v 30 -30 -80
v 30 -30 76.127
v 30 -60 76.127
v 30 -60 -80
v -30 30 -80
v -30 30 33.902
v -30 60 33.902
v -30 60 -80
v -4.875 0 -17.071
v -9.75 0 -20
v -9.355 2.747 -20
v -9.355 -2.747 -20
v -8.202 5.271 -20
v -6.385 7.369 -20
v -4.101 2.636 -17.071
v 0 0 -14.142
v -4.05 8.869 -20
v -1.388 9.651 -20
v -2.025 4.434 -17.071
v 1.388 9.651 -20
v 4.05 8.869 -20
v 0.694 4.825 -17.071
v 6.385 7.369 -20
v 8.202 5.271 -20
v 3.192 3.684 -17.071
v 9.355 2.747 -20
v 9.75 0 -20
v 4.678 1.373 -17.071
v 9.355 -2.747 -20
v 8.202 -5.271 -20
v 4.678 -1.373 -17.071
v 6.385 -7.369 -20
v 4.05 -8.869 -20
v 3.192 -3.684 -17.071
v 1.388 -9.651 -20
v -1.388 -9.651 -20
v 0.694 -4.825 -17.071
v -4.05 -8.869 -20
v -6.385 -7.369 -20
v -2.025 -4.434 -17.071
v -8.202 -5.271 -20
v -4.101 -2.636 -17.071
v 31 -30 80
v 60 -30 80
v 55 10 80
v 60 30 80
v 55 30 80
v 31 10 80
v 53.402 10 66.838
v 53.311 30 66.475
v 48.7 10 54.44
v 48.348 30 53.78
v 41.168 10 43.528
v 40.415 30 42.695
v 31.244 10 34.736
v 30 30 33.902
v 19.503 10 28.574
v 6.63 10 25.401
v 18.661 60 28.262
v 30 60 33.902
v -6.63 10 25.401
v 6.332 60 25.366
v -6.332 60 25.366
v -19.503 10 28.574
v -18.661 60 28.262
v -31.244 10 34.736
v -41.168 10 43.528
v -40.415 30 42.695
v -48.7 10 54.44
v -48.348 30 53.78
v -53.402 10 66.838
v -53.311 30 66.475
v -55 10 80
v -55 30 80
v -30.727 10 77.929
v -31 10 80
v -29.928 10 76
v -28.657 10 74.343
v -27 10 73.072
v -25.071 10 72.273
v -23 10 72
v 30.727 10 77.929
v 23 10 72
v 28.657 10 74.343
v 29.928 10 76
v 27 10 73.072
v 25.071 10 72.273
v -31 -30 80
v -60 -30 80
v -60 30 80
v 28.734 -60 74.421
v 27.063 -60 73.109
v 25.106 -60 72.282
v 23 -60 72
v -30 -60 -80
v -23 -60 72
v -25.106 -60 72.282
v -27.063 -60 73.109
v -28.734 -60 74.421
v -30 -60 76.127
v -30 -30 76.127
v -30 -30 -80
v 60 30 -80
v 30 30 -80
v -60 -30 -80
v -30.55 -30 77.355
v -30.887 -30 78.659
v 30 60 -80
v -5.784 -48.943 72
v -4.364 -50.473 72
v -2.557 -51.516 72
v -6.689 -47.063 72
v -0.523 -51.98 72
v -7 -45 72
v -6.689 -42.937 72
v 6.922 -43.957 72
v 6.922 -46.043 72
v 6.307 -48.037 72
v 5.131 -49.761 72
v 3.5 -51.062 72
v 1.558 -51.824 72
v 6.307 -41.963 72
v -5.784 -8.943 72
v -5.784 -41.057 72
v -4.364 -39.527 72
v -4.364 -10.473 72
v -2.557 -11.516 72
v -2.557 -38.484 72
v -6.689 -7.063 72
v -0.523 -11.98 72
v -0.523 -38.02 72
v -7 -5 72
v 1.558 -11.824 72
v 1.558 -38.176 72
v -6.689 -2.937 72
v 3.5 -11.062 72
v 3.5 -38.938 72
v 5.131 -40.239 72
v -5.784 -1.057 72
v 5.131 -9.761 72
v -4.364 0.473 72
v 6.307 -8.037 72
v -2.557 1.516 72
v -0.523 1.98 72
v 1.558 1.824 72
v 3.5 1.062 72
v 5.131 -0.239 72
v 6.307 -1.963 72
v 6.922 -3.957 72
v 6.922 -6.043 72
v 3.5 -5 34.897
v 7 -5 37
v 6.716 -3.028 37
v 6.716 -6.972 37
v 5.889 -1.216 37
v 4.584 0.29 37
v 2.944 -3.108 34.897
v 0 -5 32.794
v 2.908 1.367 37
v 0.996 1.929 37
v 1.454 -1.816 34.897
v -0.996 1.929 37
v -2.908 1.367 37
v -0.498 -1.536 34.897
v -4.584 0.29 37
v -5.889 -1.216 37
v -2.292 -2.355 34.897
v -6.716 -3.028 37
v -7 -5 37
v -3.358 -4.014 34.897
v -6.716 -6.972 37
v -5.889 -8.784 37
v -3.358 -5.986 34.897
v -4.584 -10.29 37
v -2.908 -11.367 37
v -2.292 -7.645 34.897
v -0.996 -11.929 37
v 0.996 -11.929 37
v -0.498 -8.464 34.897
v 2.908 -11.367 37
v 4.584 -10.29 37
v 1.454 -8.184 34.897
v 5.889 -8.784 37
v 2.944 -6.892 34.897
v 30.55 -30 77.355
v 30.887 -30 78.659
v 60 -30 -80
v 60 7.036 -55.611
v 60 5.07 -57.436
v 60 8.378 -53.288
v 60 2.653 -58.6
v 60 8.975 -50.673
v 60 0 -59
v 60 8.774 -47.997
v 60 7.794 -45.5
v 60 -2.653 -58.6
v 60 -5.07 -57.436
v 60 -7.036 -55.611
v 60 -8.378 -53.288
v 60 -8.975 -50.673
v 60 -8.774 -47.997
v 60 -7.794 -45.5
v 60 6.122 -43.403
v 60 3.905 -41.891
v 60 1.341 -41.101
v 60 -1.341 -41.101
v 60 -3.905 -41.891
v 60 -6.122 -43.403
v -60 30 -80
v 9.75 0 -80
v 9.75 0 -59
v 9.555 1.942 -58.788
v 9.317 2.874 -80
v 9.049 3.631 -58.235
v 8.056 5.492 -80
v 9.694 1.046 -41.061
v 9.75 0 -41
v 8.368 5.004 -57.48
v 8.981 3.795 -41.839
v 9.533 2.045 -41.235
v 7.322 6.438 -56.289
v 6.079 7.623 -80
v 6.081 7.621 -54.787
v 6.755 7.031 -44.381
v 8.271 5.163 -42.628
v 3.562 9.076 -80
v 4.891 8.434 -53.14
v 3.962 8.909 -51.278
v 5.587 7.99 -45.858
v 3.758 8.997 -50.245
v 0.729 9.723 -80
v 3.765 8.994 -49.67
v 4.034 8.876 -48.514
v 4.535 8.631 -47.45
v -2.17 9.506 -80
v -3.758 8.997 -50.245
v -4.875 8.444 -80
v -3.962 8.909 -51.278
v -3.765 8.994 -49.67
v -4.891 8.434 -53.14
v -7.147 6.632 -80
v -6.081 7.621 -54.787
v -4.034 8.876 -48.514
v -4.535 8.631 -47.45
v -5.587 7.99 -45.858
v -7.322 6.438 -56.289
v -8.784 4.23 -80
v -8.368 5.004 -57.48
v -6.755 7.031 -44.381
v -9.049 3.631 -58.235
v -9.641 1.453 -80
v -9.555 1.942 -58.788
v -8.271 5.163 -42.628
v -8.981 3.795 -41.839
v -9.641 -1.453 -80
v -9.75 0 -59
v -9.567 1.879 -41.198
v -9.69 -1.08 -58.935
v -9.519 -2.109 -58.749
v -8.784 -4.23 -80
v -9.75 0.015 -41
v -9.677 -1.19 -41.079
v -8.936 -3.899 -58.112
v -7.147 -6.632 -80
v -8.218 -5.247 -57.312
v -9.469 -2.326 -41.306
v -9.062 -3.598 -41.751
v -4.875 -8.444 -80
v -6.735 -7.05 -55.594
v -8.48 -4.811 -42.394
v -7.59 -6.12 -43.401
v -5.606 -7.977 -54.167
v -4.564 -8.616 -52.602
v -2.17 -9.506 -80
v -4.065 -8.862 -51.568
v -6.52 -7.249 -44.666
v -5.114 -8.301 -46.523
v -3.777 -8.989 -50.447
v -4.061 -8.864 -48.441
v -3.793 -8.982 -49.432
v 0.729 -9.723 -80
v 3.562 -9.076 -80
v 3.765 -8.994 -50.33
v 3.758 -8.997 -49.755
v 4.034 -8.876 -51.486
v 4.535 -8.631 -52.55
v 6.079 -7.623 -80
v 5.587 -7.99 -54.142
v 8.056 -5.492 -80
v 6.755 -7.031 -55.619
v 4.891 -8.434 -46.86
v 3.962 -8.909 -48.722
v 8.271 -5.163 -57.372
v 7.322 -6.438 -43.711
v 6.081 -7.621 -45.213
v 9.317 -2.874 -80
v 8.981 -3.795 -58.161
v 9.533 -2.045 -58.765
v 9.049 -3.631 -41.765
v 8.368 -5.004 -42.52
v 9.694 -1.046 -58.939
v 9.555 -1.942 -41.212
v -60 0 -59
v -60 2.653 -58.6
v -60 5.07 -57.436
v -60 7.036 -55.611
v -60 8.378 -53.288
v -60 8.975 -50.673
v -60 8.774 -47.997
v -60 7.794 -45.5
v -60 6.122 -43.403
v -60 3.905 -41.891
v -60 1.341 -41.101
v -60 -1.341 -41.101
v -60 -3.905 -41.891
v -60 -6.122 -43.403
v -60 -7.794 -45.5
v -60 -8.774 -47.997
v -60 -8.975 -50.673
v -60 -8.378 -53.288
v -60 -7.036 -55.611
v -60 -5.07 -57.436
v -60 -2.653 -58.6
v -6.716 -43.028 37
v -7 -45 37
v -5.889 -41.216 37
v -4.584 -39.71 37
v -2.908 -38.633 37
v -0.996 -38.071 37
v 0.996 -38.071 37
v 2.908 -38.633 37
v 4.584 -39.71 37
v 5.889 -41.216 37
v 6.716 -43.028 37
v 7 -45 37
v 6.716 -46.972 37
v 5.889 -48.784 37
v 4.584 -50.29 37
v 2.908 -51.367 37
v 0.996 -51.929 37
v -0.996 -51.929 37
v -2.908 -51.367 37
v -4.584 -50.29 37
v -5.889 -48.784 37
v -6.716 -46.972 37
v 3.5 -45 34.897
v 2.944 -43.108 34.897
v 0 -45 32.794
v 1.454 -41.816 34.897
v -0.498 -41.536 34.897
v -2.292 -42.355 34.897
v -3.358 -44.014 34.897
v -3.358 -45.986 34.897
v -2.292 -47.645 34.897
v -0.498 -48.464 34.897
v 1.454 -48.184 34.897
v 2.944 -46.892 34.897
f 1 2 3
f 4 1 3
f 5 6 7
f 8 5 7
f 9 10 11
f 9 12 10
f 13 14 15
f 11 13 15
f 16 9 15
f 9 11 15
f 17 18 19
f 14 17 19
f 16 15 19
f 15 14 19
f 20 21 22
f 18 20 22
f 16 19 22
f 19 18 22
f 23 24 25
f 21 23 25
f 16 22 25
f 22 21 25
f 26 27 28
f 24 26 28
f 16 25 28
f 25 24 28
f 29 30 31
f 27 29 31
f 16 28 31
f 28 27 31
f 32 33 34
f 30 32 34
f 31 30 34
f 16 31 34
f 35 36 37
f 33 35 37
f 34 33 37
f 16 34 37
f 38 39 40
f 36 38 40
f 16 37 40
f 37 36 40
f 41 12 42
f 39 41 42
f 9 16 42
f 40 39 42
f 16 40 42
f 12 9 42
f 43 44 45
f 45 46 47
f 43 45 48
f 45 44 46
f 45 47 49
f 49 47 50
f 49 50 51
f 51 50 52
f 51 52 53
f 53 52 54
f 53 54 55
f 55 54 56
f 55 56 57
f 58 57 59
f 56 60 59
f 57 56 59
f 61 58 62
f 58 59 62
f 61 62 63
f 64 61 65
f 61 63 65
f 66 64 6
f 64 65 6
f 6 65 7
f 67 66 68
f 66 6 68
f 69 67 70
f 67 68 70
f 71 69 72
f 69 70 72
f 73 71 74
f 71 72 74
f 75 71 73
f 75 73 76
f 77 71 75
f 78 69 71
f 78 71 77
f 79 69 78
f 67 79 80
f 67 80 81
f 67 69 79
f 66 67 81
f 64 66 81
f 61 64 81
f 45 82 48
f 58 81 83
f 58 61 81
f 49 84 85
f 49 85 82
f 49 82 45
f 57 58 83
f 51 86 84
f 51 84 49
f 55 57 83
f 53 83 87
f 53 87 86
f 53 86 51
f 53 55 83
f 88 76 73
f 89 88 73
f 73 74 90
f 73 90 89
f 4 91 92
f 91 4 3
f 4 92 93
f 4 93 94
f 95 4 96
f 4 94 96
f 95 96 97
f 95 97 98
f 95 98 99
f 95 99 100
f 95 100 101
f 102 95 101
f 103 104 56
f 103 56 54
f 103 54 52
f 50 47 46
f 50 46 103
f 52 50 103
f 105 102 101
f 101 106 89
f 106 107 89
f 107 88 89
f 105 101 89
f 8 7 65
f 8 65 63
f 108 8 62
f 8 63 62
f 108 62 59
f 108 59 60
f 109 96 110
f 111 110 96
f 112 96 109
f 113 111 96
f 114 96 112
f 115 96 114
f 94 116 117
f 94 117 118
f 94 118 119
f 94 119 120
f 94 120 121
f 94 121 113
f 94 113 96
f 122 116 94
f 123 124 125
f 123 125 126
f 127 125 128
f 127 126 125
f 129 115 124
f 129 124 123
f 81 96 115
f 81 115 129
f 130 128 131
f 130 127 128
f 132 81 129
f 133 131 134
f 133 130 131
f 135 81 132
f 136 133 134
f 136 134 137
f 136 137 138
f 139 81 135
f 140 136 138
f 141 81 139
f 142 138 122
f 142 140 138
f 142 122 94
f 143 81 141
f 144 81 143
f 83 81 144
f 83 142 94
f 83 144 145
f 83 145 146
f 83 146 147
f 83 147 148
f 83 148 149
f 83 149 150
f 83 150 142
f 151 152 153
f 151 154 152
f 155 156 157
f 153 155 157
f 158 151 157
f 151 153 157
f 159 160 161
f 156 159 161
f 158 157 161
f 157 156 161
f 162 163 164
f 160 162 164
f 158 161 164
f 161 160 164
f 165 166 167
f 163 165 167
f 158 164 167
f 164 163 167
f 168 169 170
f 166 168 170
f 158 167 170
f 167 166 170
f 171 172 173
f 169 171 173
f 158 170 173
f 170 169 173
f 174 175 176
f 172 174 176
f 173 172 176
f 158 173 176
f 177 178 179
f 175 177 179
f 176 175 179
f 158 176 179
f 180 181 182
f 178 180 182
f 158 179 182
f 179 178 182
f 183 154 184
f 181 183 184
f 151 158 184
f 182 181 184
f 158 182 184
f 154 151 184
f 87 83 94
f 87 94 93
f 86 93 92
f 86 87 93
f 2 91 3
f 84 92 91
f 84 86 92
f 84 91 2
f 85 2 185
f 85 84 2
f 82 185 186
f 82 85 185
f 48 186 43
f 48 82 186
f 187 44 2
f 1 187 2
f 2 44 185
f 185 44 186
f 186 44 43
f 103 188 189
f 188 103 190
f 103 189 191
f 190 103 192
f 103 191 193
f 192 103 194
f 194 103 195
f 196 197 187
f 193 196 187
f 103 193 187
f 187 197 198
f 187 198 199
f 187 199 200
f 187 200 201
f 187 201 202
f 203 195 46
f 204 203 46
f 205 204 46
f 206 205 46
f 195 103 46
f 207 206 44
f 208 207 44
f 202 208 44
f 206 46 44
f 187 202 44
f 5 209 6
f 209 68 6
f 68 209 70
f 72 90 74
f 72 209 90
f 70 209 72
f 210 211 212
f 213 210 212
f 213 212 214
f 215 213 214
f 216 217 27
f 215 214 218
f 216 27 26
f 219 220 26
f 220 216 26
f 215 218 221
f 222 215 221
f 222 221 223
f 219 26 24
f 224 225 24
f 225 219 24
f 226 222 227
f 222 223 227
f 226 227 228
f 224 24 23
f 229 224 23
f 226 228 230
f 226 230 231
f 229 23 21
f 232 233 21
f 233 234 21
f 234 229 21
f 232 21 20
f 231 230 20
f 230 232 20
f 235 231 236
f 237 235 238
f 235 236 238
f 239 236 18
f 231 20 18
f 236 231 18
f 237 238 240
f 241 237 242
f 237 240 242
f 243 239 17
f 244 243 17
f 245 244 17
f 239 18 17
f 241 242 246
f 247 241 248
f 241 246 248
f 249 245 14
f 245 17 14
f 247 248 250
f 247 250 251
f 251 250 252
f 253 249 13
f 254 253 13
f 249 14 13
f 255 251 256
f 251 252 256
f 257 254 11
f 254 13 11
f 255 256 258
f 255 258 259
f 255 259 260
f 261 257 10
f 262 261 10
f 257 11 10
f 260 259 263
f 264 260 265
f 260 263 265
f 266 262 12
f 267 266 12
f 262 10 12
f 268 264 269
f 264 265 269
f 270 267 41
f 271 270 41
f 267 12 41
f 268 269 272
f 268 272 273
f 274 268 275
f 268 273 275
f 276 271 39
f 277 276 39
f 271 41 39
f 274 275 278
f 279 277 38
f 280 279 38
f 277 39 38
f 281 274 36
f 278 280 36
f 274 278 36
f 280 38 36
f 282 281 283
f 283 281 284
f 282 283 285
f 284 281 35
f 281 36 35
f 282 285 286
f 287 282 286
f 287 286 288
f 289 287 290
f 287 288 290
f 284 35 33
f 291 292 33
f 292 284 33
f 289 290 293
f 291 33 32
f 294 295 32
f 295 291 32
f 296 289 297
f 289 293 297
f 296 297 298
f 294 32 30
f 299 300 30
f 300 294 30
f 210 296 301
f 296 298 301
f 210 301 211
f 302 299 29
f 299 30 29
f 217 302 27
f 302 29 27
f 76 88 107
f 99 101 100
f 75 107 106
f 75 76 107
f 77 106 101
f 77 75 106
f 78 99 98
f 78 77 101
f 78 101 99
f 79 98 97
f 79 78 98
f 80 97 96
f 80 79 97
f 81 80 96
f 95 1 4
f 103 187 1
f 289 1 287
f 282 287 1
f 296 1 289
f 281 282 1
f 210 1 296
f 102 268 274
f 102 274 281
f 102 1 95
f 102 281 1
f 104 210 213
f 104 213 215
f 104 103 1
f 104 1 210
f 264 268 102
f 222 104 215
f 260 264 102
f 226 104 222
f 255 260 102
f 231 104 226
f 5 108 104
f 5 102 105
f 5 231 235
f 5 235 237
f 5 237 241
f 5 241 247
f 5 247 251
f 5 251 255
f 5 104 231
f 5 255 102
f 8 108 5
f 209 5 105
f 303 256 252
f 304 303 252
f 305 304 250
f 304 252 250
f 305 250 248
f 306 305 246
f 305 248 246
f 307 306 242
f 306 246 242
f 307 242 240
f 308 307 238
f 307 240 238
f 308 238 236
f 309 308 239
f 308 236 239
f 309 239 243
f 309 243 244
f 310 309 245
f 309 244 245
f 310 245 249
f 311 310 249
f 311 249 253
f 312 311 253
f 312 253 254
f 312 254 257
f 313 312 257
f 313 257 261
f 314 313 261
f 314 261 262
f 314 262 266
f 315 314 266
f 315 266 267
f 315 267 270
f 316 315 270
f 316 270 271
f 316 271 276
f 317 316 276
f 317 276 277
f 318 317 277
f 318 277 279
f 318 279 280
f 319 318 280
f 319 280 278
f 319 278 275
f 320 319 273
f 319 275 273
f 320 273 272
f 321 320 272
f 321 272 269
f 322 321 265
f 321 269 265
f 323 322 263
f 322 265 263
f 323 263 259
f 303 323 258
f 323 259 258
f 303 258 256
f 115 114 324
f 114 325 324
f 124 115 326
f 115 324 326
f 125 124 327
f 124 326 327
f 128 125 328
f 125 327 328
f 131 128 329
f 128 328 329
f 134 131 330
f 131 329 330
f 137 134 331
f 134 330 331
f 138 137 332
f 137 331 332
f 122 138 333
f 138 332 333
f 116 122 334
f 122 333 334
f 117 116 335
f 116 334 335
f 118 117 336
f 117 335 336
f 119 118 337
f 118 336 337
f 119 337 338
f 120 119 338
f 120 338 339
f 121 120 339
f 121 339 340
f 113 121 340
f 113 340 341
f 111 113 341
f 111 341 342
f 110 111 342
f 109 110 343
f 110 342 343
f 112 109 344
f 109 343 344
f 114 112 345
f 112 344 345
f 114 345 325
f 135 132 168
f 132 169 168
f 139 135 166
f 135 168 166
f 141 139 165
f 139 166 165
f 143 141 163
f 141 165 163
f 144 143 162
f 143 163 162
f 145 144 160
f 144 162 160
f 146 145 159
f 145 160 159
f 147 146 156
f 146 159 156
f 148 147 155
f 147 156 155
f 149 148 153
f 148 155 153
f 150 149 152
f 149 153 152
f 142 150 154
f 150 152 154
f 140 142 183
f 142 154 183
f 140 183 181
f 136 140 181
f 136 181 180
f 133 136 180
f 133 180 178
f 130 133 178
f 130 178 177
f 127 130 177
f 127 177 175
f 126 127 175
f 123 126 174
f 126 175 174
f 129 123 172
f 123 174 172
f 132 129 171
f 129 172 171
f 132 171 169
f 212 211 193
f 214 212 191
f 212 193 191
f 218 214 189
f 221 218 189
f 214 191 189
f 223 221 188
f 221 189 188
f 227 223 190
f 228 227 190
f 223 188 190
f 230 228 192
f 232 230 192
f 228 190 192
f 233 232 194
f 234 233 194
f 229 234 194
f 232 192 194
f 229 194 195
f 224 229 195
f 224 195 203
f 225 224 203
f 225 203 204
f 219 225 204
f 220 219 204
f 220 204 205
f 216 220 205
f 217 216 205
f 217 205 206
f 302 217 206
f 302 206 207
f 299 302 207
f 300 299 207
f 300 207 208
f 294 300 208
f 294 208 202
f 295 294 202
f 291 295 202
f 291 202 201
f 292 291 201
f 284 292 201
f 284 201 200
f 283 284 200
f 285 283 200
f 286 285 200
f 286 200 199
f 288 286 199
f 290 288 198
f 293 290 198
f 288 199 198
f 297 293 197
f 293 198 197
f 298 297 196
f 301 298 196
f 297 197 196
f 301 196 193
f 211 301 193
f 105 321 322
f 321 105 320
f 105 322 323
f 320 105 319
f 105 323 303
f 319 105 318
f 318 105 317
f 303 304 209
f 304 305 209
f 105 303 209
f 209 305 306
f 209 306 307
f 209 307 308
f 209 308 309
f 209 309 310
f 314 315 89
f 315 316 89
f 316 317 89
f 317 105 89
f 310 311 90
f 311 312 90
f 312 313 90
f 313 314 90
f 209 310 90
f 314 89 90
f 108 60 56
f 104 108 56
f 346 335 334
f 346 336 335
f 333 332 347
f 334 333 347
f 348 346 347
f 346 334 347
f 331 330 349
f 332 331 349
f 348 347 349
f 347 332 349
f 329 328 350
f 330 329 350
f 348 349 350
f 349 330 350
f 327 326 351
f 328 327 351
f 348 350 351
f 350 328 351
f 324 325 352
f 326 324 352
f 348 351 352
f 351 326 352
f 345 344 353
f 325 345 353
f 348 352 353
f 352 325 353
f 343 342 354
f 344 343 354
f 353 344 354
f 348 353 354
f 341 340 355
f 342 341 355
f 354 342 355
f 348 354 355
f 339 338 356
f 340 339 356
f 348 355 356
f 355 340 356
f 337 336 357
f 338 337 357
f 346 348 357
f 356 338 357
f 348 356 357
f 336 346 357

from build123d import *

# Parameters (mm, degrees)
ESTRUSIONE_ESTRUSIONE1_DEPTH = 80
SCHIZZO2_R                   = 55
TAGLIO_ESTRUSIONE1_DEPTH     = 50
TAGLIO_ESTRUSIONE2_REACH     = 124.066
FORO_18_0_18_1_D             = 18
FORO_FILETTATO_M22_1_D       = 19.5
FORO_FILETTATO_M22_1_DEPTH   = 60
FORO_FILETTATO_M22_1_TIP     = 5.858391036
FORO_FILETTATO_M16_1_D       = 14
FORO_FILETTATO_M16_1_DEPTH   = 35
FORO_FILETTATO_M16_1_TIP     = 4.206024333


with BuildPart() as part:
    # Schizzo1 → Estrusione-Estrusione1 (new, symmetric)
    with BuildSketch(Plane.XY):
        Polygon((-30, 60), (30, 60), (30, 30), (60, 30), (60, -30), (30, -30), (30, -60), (-30, -60), (-30, -30), (-60, -30), (-60, 30), (-30, 30), align=None)
    extrude(amount=ESTRUSIONE_ESTRUSIONE1_DEPTH, both=True)

    # Schizzo2 → Taglio-Estrusione1 (cut)
    with BuildSketch(Plane(origin=(0, 60, 0), x_dir=(1, 0, 0), z_dir=(0, 1, 0))):
        with Locations((0, -80)):
            Circle(SCHIZZO2_R)
    extrude(amount=-TAGLIO_ESTRUSIONE1_DEPTH, mode=Mode.SUBTRACT)

    # Schizzo3 → Taglio-Estrusione2 (cut, up to next)
    with BuildSketch(Plane(origin=(0, 10, 0), x_dir=(1, 0, 0), z_dir=(0, 1, 0)), mode=Mode.PRIVATE) as taglio_estrusione2_sk1:
        with BuildLine():
            Line((-23, -72), (23, -72))
            ThreePointArc((23, -72), (31, -80), (23, -88))
            Line((23, -88), (-23, -88))
            ThreePointArc((-23, -88), (-31, -80), (-23, -72))
        make_face()
    taglio_estrusione2_tool1 = extrude(taglio_estrusione2_sk1.sketch, amount=-TAGLIO_ESTRUSIONE2_REACH, mode=Mode.PRIVATE) & part.part
    add(taglio_estrusione2_tool1.solids().sort_by_distance((0, 10, 80))[0], mode=Mode.SUBTRACT)

    # Foro Ø18.0 (18)-1 (through all)
    with Locations(Plane.ZY.offset(60)):
        with Locations((-50, 0)):
            Hole(FORO_18_0_18_1_D / 2)

    # Foro filettato M22-1
    with Locations(Plane(origin=(0, 0, -80), x_dir=(-1, 0, 0), z_dir=(0, 0, -1))):
        with Locations((0, 0)):
            Hole(FORO_FILETTATO_M22_1_D / 2, depth=FORO_FILETTATO_M22_1_DEPTH)
            with Locations((0, 0, -(FORO_FILETTATO_M22_1_DEPTH + FORO_FILETTATO_M22_1_TIP / 2))):  # 118° drill point
                Cone(0, FORO_FILETTATO_M22_1_D / 2, FORO_FILETTATO_M22_1_TIP, mode=Mode.SUBTRACT)

    # Foro filettato M16-1
    with Locations(Plane.XY.offset(72)):
        with Locations((0, -5), (0, -45)):
            Hole(FORO_FILETTATO_M16_1_D / 2, depth=FORO_FILETTATO_M16_1_DEPTH)
            with Locations((0, 0, -(FORO_FILETTATO_M16_1_DEPTH + FORO_FILETTATO_M16_1_TIP / 2))):  # 118° drill point
                Cone(0, FORO_FILETTATO_M16_1_D / 2, FORO_FILETTATO_M16_1_TIP, mode=Mode.SUBTRACT)


solid = part.part
